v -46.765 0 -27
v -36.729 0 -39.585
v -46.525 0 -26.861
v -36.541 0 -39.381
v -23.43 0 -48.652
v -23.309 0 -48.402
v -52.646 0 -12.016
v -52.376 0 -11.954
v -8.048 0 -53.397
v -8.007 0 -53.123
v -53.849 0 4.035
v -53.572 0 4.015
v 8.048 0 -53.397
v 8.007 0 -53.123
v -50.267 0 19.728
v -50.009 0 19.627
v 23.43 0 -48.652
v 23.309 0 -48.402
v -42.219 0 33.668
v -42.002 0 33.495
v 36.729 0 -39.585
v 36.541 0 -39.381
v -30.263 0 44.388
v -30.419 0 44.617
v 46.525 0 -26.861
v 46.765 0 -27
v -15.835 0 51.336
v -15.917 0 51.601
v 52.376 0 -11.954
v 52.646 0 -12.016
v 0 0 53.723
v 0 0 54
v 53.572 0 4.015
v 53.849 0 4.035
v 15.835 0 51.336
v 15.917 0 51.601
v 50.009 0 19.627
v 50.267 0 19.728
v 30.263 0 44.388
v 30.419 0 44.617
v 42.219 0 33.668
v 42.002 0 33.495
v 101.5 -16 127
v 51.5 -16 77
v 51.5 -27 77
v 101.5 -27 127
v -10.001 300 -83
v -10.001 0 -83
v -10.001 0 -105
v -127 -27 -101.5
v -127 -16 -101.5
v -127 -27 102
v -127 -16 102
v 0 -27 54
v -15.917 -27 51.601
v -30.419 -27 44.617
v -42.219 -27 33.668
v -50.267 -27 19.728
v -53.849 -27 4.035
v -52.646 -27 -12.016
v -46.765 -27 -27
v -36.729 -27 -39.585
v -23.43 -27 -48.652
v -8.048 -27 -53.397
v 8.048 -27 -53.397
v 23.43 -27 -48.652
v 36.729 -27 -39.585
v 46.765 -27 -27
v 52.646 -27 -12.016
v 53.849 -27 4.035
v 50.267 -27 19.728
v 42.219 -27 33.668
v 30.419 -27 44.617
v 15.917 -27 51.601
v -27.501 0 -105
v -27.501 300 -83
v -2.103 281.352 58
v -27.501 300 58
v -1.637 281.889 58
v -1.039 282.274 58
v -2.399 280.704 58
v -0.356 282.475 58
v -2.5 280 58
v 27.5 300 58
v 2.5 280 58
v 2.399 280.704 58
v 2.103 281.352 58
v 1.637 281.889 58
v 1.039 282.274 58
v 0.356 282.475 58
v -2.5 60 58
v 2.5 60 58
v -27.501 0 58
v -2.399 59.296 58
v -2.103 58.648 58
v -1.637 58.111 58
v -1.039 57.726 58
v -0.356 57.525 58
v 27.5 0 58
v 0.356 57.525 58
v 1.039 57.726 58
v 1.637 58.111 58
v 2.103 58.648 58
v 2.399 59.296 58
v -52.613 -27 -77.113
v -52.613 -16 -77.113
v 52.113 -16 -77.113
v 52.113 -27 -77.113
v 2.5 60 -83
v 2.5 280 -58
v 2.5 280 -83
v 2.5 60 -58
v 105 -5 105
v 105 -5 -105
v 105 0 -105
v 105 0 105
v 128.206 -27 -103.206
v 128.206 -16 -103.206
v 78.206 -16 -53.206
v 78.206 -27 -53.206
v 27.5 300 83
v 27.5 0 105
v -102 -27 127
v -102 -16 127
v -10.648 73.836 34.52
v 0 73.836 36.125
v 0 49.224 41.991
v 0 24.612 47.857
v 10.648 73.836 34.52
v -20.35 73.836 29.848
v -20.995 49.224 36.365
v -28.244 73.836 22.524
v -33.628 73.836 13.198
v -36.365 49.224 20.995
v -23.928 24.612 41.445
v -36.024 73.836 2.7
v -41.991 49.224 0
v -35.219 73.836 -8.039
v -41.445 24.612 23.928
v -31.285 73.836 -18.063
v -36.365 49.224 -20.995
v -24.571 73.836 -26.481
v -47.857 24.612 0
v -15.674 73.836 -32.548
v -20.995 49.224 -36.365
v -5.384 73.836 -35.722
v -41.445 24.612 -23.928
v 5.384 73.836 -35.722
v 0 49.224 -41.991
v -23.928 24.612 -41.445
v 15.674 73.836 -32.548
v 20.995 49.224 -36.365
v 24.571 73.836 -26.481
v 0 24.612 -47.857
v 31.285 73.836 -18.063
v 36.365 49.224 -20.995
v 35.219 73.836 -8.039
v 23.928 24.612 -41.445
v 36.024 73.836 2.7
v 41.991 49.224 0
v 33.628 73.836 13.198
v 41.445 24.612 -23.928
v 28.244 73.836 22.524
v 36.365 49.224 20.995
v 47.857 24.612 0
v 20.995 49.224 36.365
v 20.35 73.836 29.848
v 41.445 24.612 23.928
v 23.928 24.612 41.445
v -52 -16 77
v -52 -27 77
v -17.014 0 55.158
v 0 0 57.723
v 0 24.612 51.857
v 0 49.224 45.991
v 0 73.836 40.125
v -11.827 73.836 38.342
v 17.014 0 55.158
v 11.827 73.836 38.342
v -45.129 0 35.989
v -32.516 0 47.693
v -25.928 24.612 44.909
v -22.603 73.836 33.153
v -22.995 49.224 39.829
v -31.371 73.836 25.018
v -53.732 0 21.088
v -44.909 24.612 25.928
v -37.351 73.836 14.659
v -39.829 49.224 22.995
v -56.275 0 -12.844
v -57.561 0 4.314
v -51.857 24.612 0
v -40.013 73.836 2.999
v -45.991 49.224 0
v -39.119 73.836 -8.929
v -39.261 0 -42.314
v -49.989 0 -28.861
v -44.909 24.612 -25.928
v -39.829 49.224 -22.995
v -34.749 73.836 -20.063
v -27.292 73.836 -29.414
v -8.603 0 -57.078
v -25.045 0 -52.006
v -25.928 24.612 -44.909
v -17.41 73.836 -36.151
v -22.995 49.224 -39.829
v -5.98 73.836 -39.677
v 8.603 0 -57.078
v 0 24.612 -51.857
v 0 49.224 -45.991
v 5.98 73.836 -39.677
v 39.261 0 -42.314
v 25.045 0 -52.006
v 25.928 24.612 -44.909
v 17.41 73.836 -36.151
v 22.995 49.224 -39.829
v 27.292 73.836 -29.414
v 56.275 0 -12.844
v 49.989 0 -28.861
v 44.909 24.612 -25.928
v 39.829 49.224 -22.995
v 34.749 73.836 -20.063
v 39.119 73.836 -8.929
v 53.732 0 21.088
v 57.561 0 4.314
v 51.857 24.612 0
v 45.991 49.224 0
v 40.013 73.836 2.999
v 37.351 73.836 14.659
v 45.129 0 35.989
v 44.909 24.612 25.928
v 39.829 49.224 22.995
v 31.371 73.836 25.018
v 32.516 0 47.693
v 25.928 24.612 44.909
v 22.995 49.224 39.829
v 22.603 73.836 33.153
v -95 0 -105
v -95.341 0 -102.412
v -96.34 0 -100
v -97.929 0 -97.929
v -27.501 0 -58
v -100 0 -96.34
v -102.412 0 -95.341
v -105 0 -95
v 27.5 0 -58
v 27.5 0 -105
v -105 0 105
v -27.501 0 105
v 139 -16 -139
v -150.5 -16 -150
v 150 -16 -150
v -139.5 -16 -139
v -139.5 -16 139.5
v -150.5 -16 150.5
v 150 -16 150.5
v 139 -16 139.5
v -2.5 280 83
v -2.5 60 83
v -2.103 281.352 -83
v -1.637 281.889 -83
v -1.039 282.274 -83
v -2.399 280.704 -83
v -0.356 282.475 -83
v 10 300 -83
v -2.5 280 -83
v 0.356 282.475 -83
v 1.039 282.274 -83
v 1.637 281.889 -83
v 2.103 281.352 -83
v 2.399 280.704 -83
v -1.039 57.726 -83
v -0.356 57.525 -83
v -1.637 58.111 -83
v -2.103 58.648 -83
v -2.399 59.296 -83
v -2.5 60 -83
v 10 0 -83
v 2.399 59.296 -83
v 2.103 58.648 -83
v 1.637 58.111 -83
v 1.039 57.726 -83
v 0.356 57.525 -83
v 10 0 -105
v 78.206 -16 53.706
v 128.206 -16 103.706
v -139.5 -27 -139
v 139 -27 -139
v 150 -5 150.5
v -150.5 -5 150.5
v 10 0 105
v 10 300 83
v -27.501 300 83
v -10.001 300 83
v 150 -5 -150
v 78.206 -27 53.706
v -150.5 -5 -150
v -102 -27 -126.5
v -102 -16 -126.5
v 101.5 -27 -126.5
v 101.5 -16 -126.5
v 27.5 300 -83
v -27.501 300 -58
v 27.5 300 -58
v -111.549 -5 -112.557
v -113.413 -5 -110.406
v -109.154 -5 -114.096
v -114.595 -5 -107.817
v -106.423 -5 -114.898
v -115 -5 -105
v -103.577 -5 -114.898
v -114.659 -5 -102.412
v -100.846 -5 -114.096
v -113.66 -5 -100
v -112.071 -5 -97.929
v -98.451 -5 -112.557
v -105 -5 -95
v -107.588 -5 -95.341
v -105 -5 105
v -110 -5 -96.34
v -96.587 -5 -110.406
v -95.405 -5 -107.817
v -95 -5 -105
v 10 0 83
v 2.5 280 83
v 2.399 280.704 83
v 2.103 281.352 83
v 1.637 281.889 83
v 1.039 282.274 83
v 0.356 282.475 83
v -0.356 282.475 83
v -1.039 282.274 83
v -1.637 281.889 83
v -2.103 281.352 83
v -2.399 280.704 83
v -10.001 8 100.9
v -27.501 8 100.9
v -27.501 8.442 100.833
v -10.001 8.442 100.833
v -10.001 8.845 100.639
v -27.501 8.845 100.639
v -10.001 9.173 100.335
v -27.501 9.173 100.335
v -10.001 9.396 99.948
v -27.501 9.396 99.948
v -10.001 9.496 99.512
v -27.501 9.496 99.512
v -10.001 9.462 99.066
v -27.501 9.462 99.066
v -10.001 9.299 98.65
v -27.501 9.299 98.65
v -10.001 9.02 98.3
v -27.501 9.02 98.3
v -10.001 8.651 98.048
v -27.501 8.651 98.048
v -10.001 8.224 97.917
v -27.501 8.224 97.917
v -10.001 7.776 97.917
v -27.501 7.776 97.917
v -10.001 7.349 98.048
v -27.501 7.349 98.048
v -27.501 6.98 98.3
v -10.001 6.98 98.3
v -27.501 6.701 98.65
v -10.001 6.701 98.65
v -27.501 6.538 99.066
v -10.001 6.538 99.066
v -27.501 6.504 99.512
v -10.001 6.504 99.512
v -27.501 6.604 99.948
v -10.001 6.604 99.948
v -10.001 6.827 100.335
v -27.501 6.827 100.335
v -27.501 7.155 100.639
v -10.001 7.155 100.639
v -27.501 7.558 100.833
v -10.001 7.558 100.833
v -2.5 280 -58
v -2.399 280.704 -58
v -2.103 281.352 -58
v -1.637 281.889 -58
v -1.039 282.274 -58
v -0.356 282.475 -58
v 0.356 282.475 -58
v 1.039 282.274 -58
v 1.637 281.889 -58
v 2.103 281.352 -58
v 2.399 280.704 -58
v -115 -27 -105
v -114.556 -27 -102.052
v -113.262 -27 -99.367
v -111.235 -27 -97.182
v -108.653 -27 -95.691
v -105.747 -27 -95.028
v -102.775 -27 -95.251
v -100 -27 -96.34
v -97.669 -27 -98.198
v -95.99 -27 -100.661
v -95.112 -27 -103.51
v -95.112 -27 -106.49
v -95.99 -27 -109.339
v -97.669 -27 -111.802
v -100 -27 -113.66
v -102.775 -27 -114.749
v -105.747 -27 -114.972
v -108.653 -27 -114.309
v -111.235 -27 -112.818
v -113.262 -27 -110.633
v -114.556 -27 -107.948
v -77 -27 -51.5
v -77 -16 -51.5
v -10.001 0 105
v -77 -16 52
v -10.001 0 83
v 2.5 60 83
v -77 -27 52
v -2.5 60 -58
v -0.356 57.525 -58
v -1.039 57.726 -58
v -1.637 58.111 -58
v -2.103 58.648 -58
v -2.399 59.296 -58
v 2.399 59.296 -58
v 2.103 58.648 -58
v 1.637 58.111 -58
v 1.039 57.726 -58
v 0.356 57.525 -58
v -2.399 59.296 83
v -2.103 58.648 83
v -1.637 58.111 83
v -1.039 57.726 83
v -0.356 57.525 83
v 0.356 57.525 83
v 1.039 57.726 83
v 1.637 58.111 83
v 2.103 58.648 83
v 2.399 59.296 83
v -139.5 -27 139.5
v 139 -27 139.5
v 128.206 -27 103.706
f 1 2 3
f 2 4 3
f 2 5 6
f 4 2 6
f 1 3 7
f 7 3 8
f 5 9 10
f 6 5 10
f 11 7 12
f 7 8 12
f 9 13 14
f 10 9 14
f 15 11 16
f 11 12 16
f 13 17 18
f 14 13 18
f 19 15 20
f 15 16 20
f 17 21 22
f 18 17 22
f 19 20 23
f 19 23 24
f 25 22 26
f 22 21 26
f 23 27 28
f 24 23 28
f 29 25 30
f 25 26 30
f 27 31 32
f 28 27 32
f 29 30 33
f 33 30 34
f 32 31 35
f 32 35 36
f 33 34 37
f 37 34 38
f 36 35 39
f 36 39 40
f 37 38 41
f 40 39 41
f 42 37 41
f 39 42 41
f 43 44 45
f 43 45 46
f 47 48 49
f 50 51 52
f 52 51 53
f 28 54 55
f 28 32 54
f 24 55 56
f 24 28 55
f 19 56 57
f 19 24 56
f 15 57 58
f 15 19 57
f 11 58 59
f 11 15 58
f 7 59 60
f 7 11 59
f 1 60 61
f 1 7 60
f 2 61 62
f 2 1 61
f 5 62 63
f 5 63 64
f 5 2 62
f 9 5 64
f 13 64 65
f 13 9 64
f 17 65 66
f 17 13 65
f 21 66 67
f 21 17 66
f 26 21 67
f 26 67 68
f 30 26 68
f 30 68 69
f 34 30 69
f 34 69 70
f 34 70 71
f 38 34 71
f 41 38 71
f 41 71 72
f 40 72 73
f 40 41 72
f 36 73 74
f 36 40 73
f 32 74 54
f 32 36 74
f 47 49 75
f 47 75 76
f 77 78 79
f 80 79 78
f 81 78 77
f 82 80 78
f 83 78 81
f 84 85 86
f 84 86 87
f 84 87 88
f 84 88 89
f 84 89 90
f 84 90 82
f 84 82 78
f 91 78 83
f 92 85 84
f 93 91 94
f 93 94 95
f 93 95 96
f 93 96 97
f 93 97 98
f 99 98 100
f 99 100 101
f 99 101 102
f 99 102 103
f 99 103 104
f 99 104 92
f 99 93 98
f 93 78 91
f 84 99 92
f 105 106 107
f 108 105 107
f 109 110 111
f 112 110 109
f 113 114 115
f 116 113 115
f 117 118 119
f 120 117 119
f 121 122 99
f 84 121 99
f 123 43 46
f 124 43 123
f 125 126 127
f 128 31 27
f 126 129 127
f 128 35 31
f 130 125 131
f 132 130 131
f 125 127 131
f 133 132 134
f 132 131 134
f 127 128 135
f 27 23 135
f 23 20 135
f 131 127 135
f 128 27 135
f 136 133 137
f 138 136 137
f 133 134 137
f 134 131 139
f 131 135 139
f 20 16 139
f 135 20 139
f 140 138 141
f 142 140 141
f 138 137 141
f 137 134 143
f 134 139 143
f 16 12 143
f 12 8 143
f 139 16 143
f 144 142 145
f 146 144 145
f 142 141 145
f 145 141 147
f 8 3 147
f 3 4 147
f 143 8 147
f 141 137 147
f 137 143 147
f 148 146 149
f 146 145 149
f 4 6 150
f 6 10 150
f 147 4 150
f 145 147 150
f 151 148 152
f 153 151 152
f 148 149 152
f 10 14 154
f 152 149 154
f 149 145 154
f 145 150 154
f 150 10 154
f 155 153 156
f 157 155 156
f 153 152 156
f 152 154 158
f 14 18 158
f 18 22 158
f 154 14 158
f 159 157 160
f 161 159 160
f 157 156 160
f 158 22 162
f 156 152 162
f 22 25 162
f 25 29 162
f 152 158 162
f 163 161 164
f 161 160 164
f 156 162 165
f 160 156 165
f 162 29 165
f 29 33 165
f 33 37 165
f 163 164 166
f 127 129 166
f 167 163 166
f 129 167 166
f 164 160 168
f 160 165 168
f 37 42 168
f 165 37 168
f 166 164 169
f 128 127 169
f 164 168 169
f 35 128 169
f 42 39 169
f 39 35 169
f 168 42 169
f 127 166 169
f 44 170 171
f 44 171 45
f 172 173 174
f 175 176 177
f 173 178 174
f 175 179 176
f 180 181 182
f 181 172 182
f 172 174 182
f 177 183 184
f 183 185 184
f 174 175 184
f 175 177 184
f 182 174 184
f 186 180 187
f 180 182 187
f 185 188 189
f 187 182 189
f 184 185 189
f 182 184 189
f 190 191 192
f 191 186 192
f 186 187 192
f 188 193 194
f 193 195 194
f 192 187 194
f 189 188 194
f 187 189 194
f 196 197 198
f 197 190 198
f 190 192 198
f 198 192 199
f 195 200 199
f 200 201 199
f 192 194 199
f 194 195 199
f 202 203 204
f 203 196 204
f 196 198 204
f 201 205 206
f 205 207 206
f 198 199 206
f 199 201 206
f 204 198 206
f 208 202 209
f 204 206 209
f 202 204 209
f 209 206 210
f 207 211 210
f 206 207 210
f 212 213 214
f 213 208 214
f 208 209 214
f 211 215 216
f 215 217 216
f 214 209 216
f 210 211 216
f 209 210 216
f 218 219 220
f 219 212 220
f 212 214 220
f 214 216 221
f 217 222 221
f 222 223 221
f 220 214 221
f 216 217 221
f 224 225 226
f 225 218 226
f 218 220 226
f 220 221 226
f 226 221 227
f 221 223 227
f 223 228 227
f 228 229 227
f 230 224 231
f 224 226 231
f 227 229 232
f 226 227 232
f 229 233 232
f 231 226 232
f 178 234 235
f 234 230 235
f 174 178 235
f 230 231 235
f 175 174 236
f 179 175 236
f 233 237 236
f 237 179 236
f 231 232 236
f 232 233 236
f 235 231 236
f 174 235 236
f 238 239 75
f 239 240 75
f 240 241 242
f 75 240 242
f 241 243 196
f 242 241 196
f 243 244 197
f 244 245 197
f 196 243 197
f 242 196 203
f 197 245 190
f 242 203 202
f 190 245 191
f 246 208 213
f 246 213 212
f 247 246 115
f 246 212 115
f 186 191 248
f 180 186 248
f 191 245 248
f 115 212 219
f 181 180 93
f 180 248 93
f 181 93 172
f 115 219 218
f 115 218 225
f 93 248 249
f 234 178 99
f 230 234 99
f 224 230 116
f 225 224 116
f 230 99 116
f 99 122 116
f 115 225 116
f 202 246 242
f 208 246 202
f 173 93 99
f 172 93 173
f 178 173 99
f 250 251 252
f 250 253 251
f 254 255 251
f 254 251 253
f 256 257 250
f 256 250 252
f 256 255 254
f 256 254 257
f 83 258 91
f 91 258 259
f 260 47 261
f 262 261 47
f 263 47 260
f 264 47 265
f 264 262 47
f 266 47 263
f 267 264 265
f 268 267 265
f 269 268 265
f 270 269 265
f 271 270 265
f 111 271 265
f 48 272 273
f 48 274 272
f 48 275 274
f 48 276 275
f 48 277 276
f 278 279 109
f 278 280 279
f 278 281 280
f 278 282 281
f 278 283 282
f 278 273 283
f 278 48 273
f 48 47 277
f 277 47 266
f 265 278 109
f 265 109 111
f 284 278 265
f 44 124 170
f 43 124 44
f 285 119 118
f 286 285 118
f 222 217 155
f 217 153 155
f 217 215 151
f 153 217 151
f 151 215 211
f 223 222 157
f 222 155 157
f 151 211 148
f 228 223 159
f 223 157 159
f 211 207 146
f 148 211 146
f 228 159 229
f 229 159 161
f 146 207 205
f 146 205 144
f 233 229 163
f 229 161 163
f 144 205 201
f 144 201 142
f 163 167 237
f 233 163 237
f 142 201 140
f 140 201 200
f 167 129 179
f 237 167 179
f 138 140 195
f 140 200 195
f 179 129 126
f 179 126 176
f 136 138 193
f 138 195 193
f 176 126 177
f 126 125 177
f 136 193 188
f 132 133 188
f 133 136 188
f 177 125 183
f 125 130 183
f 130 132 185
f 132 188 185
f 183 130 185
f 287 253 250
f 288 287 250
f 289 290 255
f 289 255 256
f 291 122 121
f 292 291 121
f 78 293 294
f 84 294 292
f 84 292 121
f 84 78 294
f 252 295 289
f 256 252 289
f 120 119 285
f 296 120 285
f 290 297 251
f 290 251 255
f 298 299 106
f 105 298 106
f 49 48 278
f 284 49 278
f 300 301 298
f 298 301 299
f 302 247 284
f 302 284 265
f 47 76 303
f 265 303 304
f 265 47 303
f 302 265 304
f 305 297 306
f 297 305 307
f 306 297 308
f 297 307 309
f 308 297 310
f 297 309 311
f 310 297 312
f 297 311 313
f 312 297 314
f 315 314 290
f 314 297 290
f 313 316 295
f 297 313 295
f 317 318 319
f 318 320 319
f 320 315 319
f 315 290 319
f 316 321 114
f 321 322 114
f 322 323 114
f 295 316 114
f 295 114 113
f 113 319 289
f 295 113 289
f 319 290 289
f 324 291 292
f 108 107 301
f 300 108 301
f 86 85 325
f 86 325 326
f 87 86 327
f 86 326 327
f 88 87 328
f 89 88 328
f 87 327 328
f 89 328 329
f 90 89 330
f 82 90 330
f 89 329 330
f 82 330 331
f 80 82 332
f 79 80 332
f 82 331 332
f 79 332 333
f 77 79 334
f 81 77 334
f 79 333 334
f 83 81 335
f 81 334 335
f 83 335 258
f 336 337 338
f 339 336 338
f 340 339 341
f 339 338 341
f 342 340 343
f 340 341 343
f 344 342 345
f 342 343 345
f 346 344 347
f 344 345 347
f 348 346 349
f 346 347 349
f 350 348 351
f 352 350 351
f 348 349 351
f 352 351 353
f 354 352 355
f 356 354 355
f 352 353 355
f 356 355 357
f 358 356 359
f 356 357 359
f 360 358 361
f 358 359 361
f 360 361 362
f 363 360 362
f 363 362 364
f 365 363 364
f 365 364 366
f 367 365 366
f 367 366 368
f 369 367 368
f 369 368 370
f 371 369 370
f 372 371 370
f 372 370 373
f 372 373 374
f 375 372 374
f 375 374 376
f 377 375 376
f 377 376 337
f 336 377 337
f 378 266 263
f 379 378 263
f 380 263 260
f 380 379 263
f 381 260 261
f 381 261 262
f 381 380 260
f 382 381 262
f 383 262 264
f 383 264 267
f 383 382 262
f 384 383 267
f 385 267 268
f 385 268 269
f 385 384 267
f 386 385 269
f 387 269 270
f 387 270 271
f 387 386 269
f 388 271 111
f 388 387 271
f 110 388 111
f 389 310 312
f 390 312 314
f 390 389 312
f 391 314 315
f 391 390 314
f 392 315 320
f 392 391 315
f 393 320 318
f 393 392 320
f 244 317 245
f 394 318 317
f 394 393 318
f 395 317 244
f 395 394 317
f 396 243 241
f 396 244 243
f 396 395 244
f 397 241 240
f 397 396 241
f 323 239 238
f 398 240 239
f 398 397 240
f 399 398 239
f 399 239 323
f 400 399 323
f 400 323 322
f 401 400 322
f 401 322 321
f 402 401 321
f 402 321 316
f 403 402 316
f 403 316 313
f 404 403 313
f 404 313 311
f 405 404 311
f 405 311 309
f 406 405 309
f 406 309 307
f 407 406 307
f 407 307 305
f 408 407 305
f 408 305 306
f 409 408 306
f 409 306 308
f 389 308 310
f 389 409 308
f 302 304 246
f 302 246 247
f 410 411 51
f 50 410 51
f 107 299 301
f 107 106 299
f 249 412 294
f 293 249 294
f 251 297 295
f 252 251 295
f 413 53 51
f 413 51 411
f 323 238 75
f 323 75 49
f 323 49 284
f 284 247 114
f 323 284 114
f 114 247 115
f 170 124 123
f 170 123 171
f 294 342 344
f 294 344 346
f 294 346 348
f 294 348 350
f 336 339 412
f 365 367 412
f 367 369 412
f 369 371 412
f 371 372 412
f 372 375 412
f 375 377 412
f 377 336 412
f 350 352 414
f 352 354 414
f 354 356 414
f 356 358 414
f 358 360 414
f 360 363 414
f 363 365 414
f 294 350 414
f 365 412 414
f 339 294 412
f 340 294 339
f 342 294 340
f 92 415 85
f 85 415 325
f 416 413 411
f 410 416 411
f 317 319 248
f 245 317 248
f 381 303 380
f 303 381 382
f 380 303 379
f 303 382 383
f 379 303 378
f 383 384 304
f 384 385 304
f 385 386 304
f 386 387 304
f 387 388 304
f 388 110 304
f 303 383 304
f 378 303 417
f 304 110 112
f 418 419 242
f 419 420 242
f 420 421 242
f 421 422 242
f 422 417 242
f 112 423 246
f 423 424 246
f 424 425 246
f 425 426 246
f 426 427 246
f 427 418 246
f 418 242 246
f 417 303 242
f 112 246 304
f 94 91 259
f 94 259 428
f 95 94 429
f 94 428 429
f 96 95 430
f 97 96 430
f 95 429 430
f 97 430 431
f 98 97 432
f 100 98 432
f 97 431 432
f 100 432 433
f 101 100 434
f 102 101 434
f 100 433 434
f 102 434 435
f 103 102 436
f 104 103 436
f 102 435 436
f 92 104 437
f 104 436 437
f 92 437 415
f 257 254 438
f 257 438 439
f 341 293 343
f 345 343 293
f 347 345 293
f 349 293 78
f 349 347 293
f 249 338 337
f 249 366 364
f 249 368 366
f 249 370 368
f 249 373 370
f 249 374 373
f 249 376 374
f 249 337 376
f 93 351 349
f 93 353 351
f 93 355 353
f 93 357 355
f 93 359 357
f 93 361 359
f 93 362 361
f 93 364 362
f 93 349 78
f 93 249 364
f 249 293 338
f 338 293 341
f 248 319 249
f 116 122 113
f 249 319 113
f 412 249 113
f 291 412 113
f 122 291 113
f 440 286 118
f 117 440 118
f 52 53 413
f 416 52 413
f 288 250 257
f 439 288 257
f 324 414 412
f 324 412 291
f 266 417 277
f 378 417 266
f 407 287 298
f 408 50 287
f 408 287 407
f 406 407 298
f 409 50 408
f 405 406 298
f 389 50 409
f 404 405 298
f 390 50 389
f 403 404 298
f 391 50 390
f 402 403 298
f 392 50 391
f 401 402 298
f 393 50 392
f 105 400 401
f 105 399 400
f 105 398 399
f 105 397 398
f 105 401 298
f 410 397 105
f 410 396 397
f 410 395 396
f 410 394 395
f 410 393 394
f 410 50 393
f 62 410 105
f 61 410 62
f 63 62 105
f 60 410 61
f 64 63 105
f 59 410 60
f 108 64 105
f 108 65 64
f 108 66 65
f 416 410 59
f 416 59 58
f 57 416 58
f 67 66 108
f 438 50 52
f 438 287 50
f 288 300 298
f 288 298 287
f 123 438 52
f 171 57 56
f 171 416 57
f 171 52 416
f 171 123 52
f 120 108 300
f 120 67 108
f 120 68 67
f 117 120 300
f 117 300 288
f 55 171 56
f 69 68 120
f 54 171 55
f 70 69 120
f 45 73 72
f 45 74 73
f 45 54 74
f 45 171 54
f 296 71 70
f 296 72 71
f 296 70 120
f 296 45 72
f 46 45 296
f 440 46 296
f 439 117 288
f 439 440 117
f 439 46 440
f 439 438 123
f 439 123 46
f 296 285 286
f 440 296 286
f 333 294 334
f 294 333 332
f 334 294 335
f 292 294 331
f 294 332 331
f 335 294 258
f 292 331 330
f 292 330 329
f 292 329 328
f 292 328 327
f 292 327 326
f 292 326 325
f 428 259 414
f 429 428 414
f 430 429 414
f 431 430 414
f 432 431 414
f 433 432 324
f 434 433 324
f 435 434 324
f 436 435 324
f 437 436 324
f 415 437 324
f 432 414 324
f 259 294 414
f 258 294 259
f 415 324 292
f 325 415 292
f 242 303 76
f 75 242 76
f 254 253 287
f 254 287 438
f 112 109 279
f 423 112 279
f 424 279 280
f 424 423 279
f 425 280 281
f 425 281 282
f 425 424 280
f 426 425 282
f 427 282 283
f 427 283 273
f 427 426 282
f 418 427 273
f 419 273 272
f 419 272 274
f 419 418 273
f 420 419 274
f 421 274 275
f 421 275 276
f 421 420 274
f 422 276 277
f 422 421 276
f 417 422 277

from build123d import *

# Parameters (mm, degrees)
SKETCH2_W               = 210
SKETCH2_H               = 5
BOSS_EXTRUDE1_DEPTH     = 105
SKETCH5_W               = 55.001300882
SKETCH5_H               = 25
BOSS_EXTRUDE2_DEPTH     = 300
CUT_EXTRUDE3_DEPTH      = 25
CUT_EXTRUDE4_START      = -25
CUT_EXTRUDE4_DEPTH      = 25
SKETCH8_W               = 17.5
SKETCH8_H               = 22
BOSS_EXTRUDE3_DEPTH     = 300
CUT_EXTRUDE7_DEPTH      = 345.35628352
SKETCH12_R              = 1.5
CUT_EXTRUDE8_DEPTH      = 20
SKETCH13_W              = 300.5
SKETCH13_H              = 300.5
BOSS_EXTRUDE4_DEPTH     = 11
SKETCH4_R               = 54
CUT_EXTRUDE2_DEPTH      = 20
SKETCH14_W              = 278.5
SKETCH14_H              = 278.5
SKETCH14_R              = 54
BOSS_EXTRUDE5_DEPTH     = 11
CUT_EXTRUDE9_DEPTH      = 372.921362656
CUT_EXTRUDE9_DEPTH_BACK = 372.921362656
SKETCH16_R              = 10


with BuildPart() as part:
    # Sketch1 → Revolve1 (revolve)
    with BuildSketch(Plane(origin=(0, 0, 0), x_dir=(0, 0, -1), z_dir=(1, 0, 0)), mode=Mode.PRIVATE) as revolve1_sk:
        Polygon((58, -1.164167591), (40.125, 73.835832409), (36.125, 73.835832409), (54, -1.164167591), align=None)
    revolve(revolve1_sk.sketch.rotate(Axis((0, 0, 0), (0, -1, 0)), 180), axis=Axis((0, 0, 0), (0, -1, 0)))

    # Sketch2 → Boss-Extrude1 (add, symmetric)
    with BuildSketch(Plane.XY):
        with Locations((0, -2.5)):
            Rectangle(SKETCH2_W, SKETCH2_H)
    extrude(amount=BOSS_EXTRUDE1_DEPTH, both=True)

    # Sketch5 → Boss-Extrude2 (add)
    with BuildSketch(Plane(origin=(0, 0, 0), x_dir=(1, 0, 0), z_dir=(0, 1, 0))):
        with Locations((-0.000650441, 70.5)):
            Rectangle(SKETCH5_W, SKETCH5_H)
        with Locations((-0.000650441, -70.5)):
            Rectangle(SKETCH5_W, SKETCH5_H)
    extrude(amount=BOSS_EXTRUDE2_DEPTH)

    # Sketch6 → Cut-Extrude3 (cut)
    with BuildSketch(Plane.XY.offset(83)):
        with BuildLine():
            Line((-2.5, 280), (-2.5, 60))
            ThreePointArc((-2.5, 60), (0, 57.5), (2.5, 60))
            Line((2.5, 60), (2.5, 280))
            ThreePointArc((2.5, 280), (0, 282.5), (-2.5, 280))
        make_face()
    extrude(amount=-CUT_EXTRUDE3_DEPTH, mode=Mode.SUBTRACT)

    # Sketch7 → Cut-Extrude4 (cut)
    with BuildSketch(Plane(origin=(0, 0, -83), x_dir=(-1, 0, 0), z_dir=(0, 0, -1)).offset(CUT_EXTRUDE4_START)):
        with BuildLine():
            Line((-2.5, 280), (-2.5, 60))
            ThreePointArc((-2.5, 60), (0, 57.5), (2.5, 60))
            Line((2.5, 60), (2.5, 280))
            ThreePointArc((2.5, 280), (0, 282.5), (-2.5, 280))
        make_face()
    extrude(amount=CUT_EXTRUDE4_DEPTH, mode=Mode.SUBTRACT)

    # Sketch8 → Boss-Extrude3 (add)
    with BuildSketch(Plane(origin=(0, 0, 0), x_dir=(1, 0, 0), z_dir=(0, 1, 0))):
        with Locations((18.75, -94)):
            Rectangle(SKETCH8_W, SKETCH8_H)
        with Locations((-18.751300882, 94)):
            Rectangle(SKETCH8_W, SKETCH8_H)
        with Locations((-18.751300882, -94)):
            Rectangle(SKETCH8_W, SKETCH8_H)
        with Locations((18.75, 94)):
            Rectangle(SKETCH8_W, SKETCH8_H)
    extrude(amount=BOSS_EXTRUDE3_DEPTH)

    # Sketch11 → Cut-Extrude7 (cut, through all)
    with BuildSketch(Plane(origin=(27.5, 0, 0), x_dir=(0, 0, -1), z_dir=(1, 0, 0))):
        Polygon((-105, 0), (-83, 300), (-105, 300), align=None)
        Polygon((105, 300), (105, 0), (83, 300), align=None)
    extrude(amount=-CUT_EXTRUDE7_DEPTH, mode=Mode.SUBTRACT)

    # Sketch12 → Cut-Extrude8 (cut)
    with BuildSketch(Plane.ZY.offset(27.501300882)):
        with Locations((99.399906916, 8)):
            Circle(SKETCH12_R)
    extrude(amount=-CUT_EXTRUDE8_DEPTH, mode=Mode.SUBTRACT)

    # Sketch13 → Boss-Extrude4 (add)
    with BuildSketch(Plane.XZ.offset(5)):
        with Locations((-0.25, 0.25)):
            Rectangle(SKETCH13_W, SKETCH13_H)
    extrude(amount=BOSS_EXTRUDE4_DEPTH)

    # Sketch4 → Cut-Extrude2 (cut)
    with BuildSketch(Plane(origin=(0, 0, 0), x_dir=(1, 0, 0), z_dir=(0, 1, 0))):
        with Locations(Location((0, 0, 0), (0, 0, 270))):
            Circle(SKETCH4_R)
    extrude(amount=-CUT_EXTRUDE2_DEPTH, mode=Mode.SUBTRACT)

    # Sketch14 → Boss-Extrude5 (add)
    with BuildSketch(Plane.XZ.offset(16)):
        with Locations((-0.25, 0.25)):
            Rectangle(SKETCH14_W, SKETCH14_H)
        with Locations(Location((0, 0, 0), (0, 0, 90))):
            Circle(SKETCH14_R, mode=Mode.SUBTRACT)
        Polygon((-102, 127), (-52, 77), (51.5, 77), (101.5, 127), align=None, mode=Mode.SUBTRACT)
        Polygon((-127, 102), (-77, 52), (-77, -51.5), (-127, -101.5), align=None, mode=Mode.SUBTRACT)
        Polygon((-102, -126.5), (-52.613173487, -77.113173487), (52.113173487, -77.113173487), (101.5, -126.5), align=None, mode=Mode.SUBTRACT)
        Polygon((128.205701443, 103.705701443), (128.205701443, -103.205701443), (78.205701443, -53.205701443), (78.205701443, 53.705701443), align=None, mode=Mode.SUBTRACT)
    extrude(amount=BOSS_EXTRUDE5_DEPTH)

    # Sketch16 → Cut-Extrude9 (cut, two sides: drawn at the far end of the back side and taken through both)
    with BuildSketch(Plane(origin=(0, -5, 0), x_dir=(1, 0, 0), z_dir=(0, 1, 0)).offset(-CUT_EXTRUDE9_DEPTH_BACK)):
        with Locations(Location((-105, 105, 0), (0, 0, 180))):
            Circle(SKETCH16_R)
    extrude(amount=CUT_EXTRUDE9_DEPTH + CUT_EXTRUDE9_DEPTH_BACK, mode=Mode.SUBTRACT)


solid = part.part
